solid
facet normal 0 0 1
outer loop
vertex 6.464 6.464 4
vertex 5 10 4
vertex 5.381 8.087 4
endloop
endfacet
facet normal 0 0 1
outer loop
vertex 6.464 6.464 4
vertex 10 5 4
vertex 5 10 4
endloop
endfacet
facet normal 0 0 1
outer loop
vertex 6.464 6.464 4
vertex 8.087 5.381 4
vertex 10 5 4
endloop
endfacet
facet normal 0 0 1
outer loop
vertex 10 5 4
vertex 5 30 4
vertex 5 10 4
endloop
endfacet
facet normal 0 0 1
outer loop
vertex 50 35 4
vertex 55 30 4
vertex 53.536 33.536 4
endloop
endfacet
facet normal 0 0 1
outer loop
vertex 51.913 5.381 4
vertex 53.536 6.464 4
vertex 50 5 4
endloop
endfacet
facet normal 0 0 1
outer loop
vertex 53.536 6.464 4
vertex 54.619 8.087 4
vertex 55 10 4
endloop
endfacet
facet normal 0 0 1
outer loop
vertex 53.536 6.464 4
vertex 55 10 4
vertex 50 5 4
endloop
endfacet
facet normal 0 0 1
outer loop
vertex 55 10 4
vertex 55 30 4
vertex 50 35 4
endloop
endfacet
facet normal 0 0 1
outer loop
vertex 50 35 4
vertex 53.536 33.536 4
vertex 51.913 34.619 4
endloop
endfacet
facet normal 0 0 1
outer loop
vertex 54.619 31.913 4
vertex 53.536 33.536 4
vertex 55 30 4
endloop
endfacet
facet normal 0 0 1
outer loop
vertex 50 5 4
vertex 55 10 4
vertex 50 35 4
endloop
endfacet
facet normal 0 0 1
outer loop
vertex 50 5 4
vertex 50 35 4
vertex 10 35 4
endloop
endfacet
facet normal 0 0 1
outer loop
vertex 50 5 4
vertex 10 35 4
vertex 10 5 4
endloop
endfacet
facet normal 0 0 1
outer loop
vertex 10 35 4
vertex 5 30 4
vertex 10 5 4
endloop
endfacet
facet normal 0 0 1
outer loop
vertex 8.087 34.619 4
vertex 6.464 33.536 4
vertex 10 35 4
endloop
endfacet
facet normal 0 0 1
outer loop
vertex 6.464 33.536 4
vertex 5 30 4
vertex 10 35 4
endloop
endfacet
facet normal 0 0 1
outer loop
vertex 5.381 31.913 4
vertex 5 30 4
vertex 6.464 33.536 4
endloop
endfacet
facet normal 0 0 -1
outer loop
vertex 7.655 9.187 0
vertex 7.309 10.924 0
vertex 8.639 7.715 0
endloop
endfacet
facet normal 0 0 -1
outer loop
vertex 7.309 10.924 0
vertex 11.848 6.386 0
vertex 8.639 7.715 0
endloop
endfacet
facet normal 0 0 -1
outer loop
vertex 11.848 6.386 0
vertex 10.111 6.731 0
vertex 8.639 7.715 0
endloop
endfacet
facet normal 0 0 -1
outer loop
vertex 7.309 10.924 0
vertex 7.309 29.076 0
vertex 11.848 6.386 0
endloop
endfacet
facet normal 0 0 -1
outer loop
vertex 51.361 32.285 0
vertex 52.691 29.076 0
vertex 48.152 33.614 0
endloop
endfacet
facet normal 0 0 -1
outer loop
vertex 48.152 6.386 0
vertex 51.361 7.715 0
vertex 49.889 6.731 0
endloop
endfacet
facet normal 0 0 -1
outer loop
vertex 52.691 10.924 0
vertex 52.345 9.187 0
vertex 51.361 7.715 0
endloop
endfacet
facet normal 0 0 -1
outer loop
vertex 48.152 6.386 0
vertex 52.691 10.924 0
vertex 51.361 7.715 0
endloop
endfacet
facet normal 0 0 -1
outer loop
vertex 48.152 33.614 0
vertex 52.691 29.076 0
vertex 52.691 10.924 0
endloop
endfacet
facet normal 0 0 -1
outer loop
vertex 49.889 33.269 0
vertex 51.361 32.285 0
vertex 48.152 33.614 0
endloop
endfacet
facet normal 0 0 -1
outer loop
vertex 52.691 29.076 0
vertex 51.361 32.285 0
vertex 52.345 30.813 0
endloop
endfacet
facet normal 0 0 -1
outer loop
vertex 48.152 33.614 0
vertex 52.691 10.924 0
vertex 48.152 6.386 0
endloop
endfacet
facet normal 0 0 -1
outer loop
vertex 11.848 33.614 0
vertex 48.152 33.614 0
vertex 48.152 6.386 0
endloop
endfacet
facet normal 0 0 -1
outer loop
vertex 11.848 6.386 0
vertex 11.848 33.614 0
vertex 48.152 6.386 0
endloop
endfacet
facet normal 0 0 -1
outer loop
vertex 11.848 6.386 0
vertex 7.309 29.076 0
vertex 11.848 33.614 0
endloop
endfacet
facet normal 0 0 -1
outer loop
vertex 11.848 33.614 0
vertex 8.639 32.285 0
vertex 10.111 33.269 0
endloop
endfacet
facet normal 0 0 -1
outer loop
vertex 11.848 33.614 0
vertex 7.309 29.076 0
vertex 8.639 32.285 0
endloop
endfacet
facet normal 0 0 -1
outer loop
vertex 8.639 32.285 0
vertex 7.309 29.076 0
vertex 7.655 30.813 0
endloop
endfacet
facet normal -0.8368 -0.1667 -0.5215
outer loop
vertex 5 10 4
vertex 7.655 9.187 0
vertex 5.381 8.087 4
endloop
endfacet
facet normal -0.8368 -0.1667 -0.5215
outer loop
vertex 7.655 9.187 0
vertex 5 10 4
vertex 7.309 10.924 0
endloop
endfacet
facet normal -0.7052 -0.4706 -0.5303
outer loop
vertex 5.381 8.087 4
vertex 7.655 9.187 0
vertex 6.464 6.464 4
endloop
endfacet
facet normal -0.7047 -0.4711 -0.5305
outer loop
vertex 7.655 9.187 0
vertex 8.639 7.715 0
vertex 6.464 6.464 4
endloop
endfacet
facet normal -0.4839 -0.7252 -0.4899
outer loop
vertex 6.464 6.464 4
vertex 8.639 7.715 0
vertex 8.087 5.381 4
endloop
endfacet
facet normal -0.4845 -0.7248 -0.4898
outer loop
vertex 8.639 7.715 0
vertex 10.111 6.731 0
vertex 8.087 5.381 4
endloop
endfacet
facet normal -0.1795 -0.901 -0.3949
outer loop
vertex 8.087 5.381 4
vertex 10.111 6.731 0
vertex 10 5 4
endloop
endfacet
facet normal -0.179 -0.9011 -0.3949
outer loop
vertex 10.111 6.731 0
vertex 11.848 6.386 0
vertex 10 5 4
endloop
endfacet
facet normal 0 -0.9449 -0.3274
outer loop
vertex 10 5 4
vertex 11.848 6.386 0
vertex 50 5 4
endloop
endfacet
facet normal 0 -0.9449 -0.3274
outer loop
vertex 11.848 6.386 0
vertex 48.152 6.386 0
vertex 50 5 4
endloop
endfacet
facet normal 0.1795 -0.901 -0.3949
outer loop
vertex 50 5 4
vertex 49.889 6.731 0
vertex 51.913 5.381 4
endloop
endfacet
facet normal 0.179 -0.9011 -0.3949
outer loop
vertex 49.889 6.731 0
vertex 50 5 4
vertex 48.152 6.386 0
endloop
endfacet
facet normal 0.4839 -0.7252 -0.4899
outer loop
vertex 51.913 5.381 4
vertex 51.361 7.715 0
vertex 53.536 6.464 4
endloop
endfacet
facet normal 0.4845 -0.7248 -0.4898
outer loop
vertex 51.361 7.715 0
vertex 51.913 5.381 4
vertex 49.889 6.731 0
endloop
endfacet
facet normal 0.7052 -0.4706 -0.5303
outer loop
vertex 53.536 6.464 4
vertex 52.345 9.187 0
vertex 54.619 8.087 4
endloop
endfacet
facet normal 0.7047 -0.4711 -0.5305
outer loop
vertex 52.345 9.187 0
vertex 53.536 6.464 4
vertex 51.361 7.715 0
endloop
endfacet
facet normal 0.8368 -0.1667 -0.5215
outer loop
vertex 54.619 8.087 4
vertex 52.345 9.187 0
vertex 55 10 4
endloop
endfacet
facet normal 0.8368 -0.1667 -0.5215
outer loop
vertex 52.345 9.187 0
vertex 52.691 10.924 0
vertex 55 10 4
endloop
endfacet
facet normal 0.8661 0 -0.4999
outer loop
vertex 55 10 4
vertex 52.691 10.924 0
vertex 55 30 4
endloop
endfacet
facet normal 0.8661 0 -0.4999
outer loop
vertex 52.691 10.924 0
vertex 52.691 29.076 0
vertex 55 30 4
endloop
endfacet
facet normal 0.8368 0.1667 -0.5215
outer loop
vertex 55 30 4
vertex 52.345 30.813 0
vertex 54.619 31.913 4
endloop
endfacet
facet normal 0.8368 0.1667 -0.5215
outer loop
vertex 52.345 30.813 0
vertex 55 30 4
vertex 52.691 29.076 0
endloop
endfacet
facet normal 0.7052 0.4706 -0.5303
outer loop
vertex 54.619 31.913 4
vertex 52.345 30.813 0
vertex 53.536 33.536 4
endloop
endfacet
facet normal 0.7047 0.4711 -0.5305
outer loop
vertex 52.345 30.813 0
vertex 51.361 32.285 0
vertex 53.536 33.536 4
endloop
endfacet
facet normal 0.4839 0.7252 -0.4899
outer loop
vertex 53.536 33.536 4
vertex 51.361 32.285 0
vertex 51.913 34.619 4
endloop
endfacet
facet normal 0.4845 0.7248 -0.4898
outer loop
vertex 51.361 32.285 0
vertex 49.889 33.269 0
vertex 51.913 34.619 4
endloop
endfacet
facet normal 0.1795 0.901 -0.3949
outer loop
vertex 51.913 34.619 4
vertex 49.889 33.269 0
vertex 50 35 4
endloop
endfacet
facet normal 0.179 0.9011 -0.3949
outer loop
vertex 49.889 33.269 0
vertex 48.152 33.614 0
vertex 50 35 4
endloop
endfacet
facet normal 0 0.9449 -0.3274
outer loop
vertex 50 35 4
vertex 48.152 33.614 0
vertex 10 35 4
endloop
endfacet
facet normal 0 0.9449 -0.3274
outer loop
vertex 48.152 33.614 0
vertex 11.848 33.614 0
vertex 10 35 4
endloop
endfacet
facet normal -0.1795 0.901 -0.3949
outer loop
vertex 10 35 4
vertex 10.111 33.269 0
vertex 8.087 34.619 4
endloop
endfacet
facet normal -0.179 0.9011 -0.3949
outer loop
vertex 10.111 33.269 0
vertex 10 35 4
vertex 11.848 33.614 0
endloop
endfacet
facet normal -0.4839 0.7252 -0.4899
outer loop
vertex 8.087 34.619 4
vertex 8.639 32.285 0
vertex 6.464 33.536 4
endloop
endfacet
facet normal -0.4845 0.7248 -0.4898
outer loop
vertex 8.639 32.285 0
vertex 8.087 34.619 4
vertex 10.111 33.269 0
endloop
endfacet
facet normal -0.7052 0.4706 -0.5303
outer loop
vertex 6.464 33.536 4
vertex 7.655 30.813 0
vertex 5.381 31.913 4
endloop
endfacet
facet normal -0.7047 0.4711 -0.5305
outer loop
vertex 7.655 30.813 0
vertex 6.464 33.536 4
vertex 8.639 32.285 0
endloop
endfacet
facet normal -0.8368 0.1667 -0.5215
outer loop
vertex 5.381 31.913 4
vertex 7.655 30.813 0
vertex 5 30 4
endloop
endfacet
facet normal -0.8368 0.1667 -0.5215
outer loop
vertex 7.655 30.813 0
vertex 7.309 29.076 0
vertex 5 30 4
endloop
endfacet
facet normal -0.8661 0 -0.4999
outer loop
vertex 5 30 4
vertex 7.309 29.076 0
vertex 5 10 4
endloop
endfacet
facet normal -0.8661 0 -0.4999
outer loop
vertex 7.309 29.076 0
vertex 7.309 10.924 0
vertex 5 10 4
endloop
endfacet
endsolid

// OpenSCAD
module roundedCube(x, y, z, r, scale=1, reversed=false, center=false, angle=0) {
  extrudeScale = scale != 1 ? scale : (x - (z * tan(angle) * 2))/x;
  echo(str("roundedCube scale=", extrudeScale));
  // Determine final tranformations
  translateX = center ? 0 : x/2;
  translateY = center ? 0 : y/2;
  translateZ = reversed ? -1*z : 0;
  mirrorZ = reversed ? 1 : 0;

  mirror([0,0,mirrorZ]) 
    translate([translateX, translateY, translateZ])
      // Draw
      linear_extrude(height=z,scale=extrudeScale) {
        translate([-x/2, -y/2, 0]) hull() {
          translate([r, r, 0]) circle(r);
          translate([x - r, r, 0]) circle(r);
          translate([r, y - r, 0]) circle(r);
          translate([x - r, y - r, 0]) circle(r);
        }
      }
}

%translate([0,0,4]) roundedCube(60, 40, 20, 5);
translate([5,5,0]) roundedCube(50, 30, 4, 5, reversed = true, angle = 30);
